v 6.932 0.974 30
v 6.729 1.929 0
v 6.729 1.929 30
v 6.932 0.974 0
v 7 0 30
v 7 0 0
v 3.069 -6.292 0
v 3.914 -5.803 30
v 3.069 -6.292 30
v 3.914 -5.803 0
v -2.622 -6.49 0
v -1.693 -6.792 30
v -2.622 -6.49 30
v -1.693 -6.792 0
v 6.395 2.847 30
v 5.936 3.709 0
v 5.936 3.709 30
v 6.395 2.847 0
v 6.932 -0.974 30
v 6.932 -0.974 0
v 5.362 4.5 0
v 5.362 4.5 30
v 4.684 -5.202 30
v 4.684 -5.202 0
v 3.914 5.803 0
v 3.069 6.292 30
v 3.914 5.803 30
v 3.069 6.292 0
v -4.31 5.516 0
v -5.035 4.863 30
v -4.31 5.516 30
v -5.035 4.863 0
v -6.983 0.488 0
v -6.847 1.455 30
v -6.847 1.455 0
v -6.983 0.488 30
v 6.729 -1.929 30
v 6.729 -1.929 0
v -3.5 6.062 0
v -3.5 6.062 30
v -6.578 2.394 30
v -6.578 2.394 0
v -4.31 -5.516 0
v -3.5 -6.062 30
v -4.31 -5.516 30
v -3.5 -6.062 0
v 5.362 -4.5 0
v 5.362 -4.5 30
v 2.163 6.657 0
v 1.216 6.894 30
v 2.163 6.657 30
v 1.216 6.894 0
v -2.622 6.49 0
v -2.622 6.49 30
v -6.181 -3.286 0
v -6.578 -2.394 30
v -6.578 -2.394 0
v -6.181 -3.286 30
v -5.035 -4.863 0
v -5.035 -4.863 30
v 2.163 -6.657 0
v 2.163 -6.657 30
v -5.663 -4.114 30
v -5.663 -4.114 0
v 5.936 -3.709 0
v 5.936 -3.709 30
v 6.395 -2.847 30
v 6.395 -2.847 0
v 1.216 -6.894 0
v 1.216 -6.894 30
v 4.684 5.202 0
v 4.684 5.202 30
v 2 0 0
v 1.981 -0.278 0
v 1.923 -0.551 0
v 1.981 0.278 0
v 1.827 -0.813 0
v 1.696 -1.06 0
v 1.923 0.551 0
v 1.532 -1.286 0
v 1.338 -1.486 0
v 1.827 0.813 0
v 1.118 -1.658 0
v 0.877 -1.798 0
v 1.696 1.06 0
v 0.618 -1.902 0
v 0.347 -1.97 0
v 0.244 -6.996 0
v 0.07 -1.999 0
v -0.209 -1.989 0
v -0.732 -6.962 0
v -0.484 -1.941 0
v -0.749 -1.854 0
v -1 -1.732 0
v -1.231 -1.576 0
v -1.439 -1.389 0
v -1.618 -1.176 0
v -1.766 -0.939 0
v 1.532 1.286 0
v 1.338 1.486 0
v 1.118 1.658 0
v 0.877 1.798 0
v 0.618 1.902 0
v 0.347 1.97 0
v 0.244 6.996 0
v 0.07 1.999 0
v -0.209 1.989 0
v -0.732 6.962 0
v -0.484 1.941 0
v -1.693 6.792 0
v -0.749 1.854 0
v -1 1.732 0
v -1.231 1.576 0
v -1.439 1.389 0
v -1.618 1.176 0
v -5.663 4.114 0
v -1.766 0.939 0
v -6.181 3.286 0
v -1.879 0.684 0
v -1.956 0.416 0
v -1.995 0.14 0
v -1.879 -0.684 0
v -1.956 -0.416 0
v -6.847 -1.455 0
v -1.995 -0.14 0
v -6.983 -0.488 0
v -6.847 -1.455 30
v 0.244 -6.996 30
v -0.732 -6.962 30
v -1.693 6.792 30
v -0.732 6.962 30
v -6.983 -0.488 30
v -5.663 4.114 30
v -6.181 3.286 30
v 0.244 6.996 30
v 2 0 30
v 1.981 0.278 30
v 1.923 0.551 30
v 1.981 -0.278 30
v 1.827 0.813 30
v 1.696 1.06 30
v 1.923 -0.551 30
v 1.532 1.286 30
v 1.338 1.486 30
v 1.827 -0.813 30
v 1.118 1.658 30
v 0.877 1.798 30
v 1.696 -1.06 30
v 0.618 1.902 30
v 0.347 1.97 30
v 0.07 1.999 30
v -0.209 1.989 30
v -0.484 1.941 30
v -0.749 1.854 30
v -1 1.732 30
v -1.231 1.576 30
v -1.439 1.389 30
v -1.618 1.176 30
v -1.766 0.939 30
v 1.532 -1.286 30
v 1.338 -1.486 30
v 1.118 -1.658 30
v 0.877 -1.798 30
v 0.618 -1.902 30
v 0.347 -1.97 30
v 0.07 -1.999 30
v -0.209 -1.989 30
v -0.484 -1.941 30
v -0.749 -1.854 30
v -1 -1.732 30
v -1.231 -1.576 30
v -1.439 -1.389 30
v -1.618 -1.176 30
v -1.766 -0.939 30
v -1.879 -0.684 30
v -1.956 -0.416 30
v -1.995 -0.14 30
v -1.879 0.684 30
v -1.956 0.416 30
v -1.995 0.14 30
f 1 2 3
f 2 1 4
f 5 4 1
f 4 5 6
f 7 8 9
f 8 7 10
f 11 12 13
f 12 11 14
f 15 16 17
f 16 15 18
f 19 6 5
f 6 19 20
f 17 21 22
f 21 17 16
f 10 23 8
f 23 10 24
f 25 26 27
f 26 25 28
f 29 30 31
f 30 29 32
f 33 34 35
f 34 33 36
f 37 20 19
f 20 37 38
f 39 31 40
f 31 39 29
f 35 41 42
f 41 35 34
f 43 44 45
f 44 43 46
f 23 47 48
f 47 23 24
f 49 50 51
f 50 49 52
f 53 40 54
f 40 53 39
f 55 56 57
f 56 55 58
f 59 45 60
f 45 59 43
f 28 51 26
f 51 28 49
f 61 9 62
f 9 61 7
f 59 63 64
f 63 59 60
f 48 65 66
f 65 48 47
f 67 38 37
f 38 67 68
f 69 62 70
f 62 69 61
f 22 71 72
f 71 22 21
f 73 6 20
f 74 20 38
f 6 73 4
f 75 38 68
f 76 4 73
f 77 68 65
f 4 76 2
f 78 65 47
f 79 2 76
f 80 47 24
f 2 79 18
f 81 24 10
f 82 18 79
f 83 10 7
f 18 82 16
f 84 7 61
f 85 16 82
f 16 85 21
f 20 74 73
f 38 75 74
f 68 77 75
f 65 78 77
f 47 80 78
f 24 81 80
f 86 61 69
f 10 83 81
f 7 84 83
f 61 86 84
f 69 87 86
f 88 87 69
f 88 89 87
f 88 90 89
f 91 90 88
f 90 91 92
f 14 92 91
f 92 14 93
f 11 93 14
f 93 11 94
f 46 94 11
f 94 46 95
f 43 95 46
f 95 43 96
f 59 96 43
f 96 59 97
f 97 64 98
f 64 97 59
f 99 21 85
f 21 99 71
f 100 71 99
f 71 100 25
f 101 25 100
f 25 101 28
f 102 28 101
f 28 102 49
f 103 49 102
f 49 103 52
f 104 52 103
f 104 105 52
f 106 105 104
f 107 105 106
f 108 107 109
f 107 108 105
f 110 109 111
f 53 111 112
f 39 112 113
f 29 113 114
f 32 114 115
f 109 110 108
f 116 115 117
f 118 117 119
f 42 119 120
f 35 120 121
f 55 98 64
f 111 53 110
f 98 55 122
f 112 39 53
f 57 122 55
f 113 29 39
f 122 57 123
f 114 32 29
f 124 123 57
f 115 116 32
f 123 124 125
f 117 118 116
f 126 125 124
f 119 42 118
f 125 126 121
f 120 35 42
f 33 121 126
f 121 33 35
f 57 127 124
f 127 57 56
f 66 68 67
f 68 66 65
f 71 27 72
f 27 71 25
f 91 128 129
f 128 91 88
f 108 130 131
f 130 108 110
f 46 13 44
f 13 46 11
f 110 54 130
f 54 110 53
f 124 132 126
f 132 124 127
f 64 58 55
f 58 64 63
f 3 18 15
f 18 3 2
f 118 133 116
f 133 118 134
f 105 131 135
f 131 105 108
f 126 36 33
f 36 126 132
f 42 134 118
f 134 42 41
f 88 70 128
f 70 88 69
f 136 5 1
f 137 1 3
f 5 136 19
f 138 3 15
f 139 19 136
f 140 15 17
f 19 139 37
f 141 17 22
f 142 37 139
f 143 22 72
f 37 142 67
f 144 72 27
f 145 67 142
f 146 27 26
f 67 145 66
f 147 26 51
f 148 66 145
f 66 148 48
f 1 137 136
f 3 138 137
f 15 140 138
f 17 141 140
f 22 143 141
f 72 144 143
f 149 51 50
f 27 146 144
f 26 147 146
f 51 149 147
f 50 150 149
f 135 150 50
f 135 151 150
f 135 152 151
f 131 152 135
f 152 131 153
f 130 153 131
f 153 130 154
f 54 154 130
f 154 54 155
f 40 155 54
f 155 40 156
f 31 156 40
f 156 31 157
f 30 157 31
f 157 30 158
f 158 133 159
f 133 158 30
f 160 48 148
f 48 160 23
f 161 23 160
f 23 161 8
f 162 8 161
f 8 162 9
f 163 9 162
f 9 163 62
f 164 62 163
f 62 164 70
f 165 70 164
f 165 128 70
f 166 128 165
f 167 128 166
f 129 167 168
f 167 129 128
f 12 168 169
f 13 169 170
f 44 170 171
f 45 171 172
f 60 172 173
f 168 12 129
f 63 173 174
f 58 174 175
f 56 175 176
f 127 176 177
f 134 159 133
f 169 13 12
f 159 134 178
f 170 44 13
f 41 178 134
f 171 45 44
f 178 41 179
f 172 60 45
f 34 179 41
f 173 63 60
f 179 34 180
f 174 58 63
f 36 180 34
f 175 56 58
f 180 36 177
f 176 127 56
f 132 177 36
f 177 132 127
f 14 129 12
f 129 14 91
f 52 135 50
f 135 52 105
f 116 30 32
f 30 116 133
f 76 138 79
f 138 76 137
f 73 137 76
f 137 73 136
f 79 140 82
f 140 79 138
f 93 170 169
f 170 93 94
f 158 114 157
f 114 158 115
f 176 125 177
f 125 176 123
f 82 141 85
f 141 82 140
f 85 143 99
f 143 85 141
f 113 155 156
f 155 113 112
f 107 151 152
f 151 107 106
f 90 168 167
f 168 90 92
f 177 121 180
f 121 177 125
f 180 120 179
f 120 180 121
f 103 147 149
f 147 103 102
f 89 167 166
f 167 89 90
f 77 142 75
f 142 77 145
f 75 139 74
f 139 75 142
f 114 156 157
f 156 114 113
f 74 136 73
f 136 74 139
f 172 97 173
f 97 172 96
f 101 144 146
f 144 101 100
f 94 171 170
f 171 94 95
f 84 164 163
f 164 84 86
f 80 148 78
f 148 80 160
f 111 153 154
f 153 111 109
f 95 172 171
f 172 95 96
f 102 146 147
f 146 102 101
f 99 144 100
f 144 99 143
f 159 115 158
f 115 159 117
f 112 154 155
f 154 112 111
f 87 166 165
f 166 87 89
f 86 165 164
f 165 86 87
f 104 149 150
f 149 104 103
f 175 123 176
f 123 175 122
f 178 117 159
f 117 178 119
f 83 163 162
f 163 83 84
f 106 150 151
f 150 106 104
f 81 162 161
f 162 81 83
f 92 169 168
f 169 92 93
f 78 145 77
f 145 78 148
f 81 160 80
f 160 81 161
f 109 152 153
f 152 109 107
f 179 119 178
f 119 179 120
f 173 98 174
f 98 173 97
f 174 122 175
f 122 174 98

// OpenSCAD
difference() {
cylinder(30,7,7, $fn=45);
cylinder(30,2,2, $fn=45);

}
